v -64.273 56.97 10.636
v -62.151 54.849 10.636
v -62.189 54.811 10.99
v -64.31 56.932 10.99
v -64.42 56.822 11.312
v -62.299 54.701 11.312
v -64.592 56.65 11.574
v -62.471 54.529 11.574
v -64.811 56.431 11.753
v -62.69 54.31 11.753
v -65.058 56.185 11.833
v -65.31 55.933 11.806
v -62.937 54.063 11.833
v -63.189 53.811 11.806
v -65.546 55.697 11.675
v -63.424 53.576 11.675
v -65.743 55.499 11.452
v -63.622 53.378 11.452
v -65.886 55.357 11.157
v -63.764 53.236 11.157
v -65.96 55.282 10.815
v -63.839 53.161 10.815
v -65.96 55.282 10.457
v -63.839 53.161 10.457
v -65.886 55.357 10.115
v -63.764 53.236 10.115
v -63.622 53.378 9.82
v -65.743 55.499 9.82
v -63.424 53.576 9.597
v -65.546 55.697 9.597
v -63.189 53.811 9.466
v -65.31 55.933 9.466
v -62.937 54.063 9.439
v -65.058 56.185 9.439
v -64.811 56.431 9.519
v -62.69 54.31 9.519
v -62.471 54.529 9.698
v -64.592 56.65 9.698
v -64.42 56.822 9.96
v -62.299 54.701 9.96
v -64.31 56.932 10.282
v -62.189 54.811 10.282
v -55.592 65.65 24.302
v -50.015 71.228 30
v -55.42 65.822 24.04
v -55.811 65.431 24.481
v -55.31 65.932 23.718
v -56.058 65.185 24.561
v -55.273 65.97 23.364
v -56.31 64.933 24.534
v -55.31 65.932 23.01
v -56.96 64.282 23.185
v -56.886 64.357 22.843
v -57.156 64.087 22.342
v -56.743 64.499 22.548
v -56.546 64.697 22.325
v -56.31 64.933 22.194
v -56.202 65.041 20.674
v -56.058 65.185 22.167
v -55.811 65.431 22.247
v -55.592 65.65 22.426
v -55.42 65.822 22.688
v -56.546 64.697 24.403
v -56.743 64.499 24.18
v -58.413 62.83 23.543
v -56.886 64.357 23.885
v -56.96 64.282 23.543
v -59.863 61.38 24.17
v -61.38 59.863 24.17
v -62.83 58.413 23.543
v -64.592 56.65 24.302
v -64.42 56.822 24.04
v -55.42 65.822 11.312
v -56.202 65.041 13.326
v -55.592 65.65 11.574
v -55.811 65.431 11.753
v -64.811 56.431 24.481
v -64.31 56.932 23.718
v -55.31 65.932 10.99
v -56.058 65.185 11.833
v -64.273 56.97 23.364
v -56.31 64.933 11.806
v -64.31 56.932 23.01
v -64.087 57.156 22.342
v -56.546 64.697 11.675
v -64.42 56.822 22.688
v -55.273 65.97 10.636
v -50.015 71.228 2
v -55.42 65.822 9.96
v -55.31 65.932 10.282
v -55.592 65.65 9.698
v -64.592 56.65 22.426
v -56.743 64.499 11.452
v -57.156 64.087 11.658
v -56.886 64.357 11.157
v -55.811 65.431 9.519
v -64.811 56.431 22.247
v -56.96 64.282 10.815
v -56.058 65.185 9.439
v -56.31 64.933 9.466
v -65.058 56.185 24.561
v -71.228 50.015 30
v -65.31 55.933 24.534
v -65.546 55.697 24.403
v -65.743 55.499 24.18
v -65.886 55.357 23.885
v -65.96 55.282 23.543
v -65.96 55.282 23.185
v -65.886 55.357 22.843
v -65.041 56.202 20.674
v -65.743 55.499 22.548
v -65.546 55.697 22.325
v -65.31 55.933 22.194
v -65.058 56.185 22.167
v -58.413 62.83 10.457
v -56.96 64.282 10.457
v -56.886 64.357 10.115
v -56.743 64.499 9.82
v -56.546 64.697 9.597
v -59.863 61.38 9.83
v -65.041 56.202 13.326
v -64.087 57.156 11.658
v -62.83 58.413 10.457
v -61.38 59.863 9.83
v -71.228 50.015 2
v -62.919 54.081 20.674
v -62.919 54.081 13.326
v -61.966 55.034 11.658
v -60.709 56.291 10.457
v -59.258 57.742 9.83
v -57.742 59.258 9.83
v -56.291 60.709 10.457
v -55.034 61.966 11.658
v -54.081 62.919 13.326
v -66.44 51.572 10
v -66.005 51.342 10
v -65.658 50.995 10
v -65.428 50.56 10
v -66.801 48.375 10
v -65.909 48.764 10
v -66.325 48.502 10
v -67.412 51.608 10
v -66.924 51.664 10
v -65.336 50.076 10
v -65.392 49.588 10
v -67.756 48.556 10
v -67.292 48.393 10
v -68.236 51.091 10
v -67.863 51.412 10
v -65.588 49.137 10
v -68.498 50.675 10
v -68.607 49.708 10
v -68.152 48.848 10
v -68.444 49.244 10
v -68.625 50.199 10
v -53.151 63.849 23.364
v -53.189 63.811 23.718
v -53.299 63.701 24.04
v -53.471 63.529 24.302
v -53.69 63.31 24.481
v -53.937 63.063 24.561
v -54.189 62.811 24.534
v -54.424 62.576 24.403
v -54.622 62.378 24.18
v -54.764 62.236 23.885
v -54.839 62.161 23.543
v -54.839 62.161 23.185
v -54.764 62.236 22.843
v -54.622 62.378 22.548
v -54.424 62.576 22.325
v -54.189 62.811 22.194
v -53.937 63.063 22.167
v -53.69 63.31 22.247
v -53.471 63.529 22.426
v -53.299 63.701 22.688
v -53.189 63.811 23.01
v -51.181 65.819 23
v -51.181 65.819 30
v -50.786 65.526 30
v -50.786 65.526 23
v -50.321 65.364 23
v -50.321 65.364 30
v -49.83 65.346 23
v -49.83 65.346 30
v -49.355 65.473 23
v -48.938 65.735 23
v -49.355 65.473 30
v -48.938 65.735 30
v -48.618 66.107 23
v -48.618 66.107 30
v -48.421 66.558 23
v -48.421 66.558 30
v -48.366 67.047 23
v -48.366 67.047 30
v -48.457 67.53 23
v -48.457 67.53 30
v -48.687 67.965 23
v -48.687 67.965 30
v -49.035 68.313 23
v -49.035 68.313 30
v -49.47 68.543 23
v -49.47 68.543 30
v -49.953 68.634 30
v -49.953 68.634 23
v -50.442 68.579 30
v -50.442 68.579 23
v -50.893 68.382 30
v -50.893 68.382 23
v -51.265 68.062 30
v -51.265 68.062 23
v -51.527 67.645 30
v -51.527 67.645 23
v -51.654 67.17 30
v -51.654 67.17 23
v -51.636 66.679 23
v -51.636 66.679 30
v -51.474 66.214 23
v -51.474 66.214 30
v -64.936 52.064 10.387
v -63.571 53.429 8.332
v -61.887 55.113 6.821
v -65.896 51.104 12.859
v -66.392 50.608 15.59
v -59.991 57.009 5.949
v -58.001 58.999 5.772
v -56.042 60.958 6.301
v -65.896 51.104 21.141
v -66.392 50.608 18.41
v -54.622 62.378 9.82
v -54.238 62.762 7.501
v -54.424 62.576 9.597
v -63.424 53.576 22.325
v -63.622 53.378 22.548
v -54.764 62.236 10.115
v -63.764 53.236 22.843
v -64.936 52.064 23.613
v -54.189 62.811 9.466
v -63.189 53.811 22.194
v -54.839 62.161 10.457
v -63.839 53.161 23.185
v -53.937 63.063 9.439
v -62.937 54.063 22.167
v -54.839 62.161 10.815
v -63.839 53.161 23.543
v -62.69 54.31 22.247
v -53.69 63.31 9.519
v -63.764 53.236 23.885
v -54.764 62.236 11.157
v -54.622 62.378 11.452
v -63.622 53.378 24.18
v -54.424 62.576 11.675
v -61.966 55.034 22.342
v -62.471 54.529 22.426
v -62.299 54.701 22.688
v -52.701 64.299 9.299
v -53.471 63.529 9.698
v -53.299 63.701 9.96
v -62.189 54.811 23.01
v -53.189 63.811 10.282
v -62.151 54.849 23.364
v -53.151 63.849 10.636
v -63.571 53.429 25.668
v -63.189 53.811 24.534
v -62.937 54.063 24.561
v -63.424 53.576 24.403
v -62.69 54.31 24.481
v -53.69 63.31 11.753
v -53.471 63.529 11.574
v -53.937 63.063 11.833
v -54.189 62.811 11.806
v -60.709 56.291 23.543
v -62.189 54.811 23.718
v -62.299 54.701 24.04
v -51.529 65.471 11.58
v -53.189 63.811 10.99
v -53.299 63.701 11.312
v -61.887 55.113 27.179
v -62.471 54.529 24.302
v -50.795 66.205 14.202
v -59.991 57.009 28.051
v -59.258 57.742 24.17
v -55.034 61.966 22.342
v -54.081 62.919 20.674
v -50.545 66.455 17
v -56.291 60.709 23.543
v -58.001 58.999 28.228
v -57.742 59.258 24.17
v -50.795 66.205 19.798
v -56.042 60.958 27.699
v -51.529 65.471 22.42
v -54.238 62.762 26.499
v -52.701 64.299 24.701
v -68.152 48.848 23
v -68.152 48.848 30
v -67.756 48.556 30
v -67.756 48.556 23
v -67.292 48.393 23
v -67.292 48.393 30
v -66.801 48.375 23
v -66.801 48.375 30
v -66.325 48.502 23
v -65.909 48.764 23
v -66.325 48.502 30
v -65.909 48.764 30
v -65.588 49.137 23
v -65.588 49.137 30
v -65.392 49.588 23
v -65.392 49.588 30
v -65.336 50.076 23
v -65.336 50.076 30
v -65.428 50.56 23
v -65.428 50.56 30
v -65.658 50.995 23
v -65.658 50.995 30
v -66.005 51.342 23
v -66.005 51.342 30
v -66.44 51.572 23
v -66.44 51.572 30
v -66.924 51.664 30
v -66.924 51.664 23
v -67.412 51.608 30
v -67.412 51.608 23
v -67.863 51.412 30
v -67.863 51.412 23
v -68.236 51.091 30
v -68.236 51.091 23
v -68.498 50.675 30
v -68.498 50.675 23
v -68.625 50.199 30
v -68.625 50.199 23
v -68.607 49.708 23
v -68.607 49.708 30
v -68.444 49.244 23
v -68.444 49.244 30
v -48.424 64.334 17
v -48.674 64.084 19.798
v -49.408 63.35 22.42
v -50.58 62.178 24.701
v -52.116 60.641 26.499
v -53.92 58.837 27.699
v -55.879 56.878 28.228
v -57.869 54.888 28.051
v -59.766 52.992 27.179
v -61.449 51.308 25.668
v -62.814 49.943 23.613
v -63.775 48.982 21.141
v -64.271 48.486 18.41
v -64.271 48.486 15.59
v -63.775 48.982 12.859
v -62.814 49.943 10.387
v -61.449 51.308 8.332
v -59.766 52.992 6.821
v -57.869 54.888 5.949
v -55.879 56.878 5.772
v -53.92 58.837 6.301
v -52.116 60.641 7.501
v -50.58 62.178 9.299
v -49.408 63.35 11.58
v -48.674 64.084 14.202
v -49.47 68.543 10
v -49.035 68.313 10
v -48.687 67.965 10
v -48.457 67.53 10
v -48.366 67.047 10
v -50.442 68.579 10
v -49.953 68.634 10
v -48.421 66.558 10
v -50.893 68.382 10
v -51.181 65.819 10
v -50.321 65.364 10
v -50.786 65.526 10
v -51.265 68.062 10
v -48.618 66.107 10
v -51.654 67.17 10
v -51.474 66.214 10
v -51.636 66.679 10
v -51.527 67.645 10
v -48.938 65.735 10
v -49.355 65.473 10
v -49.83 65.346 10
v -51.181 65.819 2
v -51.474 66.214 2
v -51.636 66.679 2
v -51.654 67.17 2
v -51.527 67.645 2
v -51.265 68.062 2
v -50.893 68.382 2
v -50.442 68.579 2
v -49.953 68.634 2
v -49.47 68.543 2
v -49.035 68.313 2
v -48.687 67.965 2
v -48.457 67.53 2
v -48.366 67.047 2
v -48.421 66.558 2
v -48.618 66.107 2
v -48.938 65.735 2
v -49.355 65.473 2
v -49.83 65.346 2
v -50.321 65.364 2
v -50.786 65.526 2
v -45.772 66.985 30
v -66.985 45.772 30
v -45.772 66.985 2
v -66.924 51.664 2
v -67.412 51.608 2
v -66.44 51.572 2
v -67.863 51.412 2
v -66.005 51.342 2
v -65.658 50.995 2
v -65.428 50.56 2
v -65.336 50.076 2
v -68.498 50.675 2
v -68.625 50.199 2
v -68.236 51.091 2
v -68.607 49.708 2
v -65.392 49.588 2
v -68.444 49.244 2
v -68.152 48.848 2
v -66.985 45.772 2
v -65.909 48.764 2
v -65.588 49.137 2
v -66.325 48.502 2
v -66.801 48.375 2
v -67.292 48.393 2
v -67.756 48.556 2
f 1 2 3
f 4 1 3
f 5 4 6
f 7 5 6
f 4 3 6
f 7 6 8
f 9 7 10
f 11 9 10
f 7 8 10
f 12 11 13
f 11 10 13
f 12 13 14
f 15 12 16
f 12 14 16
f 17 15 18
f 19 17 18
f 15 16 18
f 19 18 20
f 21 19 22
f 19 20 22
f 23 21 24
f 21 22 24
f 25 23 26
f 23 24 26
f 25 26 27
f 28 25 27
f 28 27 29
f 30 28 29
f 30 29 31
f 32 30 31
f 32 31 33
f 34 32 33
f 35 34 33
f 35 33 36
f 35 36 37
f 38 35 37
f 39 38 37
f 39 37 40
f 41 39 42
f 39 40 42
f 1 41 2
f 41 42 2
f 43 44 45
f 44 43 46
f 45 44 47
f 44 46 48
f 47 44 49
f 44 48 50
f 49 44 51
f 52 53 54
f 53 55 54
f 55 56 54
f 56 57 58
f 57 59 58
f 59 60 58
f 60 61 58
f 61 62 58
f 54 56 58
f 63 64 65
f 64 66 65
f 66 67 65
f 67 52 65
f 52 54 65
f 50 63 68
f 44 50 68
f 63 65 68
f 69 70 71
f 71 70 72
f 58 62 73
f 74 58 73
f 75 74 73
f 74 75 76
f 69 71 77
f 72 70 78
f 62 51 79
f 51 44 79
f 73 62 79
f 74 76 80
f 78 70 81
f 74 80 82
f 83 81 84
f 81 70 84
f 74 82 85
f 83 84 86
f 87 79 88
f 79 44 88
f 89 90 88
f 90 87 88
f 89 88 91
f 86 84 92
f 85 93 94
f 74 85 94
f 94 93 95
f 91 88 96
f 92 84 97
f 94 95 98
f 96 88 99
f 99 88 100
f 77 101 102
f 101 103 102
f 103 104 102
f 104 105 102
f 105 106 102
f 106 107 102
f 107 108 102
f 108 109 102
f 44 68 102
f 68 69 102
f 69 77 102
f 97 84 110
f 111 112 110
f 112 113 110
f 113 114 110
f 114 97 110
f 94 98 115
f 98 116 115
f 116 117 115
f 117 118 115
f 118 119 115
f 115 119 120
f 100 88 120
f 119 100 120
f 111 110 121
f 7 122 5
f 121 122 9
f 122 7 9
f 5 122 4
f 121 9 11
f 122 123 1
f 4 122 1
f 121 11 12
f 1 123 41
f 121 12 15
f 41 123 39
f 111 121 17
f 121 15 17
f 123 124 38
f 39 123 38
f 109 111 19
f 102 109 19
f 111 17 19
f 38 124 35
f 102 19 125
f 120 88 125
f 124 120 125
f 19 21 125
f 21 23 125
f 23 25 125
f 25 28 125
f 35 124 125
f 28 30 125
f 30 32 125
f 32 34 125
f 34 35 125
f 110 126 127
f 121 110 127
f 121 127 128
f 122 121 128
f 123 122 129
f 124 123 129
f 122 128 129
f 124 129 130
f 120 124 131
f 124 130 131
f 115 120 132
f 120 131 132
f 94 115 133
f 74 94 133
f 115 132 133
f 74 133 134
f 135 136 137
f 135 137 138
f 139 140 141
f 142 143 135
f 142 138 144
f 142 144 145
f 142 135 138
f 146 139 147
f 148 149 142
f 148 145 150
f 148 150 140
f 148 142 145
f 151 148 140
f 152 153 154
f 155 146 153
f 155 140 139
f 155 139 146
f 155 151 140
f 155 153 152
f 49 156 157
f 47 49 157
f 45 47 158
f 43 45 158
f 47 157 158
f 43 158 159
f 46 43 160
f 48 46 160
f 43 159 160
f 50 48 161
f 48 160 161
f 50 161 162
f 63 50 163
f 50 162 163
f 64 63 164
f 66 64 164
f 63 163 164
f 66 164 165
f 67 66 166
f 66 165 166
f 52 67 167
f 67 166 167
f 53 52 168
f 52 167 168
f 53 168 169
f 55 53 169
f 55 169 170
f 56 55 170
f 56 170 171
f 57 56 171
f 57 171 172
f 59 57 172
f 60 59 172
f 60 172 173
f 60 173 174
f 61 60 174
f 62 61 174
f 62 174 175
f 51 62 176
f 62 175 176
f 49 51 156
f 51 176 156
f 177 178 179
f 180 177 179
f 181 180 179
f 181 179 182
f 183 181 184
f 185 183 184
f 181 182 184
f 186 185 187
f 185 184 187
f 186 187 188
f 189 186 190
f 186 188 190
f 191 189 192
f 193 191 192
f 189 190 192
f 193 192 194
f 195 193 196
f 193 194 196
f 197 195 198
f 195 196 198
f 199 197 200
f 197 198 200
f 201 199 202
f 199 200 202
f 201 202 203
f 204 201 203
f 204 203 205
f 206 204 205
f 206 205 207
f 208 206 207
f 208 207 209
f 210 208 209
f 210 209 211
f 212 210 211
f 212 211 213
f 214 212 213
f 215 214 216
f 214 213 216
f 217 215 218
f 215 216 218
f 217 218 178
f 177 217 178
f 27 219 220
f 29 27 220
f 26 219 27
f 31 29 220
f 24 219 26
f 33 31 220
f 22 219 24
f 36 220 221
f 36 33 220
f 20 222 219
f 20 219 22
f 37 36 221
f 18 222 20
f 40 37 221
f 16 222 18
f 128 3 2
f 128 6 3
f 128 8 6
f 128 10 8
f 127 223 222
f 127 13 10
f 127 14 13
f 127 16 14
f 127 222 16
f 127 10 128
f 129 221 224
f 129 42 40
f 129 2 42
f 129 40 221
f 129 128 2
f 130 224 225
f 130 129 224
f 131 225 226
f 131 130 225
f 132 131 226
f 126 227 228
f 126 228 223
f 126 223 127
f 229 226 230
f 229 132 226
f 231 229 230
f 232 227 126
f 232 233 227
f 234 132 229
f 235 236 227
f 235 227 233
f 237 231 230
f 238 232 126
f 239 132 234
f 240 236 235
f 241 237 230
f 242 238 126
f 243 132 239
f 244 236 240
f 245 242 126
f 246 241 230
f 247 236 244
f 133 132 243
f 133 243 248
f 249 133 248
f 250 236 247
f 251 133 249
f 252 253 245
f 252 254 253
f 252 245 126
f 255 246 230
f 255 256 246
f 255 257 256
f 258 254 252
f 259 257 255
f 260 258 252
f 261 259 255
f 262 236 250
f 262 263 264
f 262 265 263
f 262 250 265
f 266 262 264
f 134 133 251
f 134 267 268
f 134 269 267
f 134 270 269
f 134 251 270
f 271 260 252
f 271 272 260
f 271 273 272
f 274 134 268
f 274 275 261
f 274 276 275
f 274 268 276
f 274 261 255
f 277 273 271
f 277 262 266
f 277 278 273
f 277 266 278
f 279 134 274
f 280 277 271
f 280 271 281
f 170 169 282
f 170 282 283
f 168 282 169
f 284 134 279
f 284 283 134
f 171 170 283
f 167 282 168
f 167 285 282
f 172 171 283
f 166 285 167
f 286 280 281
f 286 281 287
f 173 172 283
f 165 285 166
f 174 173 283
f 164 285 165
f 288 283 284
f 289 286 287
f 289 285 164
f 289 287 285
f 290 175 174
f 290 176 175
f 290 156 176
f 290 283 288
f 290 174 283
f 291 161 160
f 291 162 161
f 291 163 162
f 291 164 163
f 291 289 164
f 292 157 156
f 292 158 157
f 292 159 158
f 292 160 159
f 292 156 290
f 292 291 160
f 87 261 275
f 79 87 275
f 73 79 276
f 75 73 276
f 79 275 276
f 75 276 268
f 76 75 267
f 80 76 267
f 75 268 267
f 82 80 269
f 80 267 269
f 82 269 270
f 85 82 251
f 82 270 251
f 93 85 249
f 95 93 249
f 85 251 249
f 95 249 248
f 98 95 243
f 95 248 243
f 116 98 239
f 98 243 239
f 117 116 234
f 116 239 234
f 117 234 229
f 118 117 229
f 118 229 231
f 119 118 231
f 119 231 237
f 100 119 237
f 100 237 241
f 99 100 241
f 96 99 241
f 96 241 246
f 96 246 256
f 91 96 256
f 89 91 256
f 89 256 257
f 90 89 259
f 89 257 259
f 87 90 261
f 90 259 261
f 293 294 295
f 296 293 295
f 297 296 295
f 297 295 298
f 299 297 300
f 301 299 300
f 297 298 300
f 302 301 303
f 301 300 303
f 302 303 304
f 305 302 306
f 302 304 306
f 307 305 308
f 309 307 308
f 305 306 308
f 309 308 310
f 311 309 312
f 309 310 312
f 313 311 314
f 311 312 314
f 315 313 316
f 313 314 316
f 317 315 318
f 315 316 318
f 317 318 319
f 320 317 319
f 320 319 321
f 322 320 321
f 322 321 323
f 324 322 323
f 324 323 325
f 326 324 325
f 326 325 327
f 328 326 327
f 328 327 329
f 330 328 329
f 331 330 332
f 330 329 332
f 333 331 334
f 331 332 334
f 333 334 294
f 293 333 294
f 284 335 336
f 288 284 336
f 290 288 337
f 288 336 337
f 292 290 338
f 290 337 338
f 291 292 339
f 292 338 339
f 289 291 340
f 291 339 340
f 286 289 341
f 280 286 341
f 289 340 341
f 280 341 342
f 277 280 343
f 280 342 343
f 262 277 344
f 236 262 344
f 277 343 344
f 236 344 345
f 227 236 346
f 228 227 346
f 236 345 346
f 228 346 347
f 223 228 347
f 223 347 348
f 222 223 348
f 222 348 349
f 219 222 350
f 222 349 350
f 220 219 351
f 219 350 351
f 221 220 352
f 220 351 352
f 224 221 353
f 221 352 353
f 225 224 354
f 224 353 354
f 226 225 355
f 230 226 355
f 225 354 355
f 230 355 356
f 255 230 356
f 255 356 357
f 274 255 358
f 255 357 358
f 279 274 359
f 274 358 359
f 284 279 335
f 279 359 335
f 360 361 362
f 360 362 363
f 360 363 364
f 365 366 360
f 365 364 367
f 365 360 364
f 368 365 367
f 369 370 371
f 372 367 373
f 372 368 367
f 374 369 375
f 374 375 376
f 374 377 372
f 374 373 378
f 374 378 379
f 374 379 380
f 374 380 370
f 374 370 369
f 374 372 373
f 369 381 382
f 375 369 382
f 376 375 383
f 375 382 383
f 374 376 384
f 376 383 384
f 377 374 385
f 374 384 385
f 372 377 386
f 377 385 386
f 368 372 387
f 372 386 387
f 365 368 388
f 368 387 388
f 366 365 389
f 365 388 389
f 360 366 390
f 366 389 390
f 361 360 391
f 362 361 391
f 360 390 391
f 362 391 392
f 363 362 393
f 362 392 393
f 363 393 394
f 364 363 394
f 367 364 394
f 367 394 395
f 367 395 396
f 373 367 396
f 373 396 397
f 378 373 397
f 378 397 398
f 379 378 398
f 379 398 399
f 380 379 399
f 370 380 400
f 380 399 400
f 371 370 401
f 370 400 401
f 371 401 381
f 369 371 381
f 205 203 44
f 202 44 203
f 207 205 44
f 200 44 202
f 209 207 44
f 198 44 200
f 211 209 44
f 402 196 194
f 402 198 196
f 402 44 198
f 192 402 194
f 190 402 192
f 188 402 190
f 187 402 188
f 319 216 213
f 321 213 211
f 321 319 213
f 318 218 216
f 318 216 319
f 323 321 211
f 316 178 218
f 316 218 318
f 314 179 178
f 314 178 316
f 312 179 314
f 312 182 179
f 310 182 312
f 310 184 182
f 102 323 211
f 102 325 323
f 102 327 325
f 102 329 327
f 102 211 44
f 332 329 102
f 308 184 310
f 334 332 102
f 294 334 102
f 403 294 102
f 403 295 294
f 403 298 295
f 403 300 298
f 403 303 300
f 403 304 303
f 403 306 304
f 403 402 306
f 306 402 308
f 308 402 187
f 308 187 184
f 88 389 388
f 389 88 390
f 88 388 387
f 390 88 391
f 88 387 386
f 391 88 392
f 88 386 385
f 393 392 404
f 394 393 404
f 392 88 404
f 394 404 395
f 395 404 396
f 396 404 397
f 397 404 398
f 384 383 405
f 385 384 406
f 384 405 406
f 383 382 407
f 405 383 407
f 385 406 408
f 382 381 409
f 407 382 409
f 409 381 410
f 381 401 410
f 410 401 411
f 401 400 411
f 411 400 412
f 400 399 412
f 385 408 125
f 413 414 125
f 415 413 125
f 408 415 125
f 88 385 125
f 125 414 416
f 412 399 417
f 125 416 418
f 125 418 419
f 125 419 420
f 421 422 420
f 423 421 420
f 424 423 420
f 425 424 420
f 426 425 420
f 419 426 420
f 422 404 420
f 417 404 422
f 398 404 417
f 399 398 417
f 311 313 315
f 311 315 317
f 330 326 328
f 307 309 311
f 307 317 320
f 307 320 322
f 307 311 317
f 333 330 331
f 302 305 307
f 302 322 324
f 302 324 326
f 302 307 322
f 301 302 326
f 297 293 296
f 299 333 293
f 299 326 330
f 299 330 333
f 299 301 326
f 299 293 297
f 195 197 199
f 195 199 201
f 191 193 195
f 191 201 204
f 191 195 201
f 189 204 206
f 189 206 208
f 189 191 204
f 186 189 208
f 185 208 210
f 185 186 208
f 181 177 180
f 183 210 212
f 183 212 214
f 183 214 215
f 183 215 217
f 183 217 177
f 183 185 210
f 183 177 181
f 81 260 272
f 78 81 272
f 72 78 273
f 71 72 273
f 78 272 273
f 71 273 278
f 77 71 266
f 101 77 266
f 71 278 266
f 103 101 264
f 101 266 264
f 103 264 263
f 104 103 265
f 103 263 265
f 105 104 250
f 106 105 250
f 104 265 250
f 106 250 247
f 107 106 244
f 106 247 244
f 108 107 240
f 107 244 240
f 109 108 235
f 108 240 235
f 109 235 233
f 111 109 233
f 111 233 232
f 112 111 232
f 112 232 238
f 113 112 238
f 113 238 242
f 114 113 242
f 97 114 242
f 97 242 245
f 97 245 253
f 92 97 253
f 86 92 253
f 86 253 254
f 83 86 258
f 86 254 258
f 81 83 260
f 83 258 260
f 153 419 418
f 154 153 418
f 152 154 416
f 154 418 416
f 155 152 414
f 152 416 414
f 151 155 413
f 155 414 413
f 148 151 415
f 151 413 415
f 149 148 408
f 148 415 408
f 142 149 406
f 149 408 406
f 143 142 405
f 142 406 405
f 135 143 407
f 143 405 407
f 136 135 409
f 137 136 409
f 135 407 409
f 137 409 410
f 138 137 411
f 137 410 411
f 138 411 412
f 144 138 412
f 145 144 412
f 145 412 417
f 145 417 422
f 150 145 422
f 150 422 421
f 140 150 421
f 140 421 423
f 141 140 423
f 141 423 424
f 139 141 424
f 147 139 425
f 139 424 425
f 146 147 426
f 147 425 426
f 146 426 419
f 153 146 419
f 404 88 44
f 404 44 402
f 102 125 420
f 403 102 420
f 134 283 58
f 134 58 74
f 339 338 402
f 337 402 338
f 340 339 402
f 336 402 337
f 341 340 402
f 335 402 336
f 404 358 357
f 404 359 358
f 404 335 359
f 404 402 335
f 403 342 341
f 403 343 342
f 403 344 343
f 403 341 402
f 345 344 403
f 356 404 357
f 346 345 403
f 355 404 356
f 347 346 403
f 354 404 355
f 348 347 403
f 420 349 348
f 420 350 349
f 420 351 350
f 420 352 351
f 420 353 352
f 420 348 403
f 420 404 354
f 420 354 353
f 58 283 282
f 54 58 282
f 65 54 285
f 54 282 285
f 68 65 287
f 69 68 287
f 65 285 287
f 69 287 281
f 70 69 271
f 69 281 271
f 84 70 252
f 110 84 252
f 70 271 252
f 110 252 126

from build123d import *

# Parameters (mm, degrees)
SKETCH077_W             = 30
SKETCH077_H             = 6
PAD034_DEPTH            = 28
SKETCH078_R             = 11.25
POCKET039_DEPTH         = 3
SKETCH079_R             = 1.2
POCKET040_DEPTH         = 3
SKETCH080_R             = 1.65
POCKET041_DEPTH         = 7
SKETCH081_R             = 1.65
POCKET042_DEPTH         = 8
BODY024_PLACEMENT_ANGLE = 225


with BuildPart() as part:
    # Sketch077 → Pad034 (new body)
    with BuildSketch(Plane.XY):
        Rectangle(SKETCH077_W, SKETCH077_H)
    extrude(amount=PAD034_DEPTH)

    # Sketch078 (on Face4 of Pad034) → Pocket039 (cut)
    with BuildSketch(Plane(origin=(0, 3, 0), x_dir=(-1, 0, 0), z_dir=(0, 1, 0))):
        with Locations((0, 15)):
            Circle(SKETCH078_R)
    extrude(amount=-POCKET039_DEPTH, mode=Mode.SUBTRACT)

    # Sketch079 (on Face8 of Pocket039) → Pocket040 (cut)
    with BuildSketch(Plane(origin=(0, 0, 0), x_dir=(-1, 0, 0), z_dir=(0, 1, 0))):
        with Locations((6.363961, 8.636039)):
            Circle(SKETCH079_R)
        with Locations((6.363961, 21.363961)):
            Circle(SKETCH079_R)
        with Locations((-6.363961, 21.363961)):
            Circle(SKETCH079_R)
        with Locations((-6.363961, 8.636039)):
            Circle(SKETCH079_R)
        with BuildLine():
            Line((-6.25, 18.674235), (-6.25, 11.325765))
            ThreePointArc((-6.25, 11.325765), (0, 7.75), (6.25, 11.325765))
            Line((6.25, 18.674235), (6.25, 11.325765))
            ThreePointArc((6.25, 18.674235), (0, 22.25), (-6.25, 18.674235))
        make_face()
    extrude(amount=-POCKET040_DEPTH, mode=Mode.SUBTRACT)

    # Sketch080 (on Face5 of Pocket040) → Pocket041 (cut)
    with BuildSketch(Plane.XY.offset(28)):
        with Locations((-12, 0)):
            Circle(SKETCH080_R)
        with Locations((12, 0)):
            Circle(SKETCH080_R)
    extrude(amount=-POCKET041_DEPTH, mode=Mode.SUBTRACT)

    # Sketch081 (on Face4 of Pocket041) → Pocket042 (cut)
    with BuildSketch(Plane(origin=(0, 0, 0), x_dir=(1, 0, 0), z_dir=(0, 0, -1))):
        with Locations((-12, 0)):
            Circle(SKETCH081_R)
        with Locations((12, 0)):
            Circle(SKETCH081_R)
    extrude(amount=-POCKET042_DEPTH, mode=Mode.SUBTRACT)


with BuildPart() as part_1:
    # Body024 placement: moved
    add(part.part.moved(Location((-58.5, 58.5, 2))).rotate(Axis((-58.5, 58.5, 2), (0, 0, 1)), BODY024_PLACEMENT_ANGLE))


solid = part_1.part
